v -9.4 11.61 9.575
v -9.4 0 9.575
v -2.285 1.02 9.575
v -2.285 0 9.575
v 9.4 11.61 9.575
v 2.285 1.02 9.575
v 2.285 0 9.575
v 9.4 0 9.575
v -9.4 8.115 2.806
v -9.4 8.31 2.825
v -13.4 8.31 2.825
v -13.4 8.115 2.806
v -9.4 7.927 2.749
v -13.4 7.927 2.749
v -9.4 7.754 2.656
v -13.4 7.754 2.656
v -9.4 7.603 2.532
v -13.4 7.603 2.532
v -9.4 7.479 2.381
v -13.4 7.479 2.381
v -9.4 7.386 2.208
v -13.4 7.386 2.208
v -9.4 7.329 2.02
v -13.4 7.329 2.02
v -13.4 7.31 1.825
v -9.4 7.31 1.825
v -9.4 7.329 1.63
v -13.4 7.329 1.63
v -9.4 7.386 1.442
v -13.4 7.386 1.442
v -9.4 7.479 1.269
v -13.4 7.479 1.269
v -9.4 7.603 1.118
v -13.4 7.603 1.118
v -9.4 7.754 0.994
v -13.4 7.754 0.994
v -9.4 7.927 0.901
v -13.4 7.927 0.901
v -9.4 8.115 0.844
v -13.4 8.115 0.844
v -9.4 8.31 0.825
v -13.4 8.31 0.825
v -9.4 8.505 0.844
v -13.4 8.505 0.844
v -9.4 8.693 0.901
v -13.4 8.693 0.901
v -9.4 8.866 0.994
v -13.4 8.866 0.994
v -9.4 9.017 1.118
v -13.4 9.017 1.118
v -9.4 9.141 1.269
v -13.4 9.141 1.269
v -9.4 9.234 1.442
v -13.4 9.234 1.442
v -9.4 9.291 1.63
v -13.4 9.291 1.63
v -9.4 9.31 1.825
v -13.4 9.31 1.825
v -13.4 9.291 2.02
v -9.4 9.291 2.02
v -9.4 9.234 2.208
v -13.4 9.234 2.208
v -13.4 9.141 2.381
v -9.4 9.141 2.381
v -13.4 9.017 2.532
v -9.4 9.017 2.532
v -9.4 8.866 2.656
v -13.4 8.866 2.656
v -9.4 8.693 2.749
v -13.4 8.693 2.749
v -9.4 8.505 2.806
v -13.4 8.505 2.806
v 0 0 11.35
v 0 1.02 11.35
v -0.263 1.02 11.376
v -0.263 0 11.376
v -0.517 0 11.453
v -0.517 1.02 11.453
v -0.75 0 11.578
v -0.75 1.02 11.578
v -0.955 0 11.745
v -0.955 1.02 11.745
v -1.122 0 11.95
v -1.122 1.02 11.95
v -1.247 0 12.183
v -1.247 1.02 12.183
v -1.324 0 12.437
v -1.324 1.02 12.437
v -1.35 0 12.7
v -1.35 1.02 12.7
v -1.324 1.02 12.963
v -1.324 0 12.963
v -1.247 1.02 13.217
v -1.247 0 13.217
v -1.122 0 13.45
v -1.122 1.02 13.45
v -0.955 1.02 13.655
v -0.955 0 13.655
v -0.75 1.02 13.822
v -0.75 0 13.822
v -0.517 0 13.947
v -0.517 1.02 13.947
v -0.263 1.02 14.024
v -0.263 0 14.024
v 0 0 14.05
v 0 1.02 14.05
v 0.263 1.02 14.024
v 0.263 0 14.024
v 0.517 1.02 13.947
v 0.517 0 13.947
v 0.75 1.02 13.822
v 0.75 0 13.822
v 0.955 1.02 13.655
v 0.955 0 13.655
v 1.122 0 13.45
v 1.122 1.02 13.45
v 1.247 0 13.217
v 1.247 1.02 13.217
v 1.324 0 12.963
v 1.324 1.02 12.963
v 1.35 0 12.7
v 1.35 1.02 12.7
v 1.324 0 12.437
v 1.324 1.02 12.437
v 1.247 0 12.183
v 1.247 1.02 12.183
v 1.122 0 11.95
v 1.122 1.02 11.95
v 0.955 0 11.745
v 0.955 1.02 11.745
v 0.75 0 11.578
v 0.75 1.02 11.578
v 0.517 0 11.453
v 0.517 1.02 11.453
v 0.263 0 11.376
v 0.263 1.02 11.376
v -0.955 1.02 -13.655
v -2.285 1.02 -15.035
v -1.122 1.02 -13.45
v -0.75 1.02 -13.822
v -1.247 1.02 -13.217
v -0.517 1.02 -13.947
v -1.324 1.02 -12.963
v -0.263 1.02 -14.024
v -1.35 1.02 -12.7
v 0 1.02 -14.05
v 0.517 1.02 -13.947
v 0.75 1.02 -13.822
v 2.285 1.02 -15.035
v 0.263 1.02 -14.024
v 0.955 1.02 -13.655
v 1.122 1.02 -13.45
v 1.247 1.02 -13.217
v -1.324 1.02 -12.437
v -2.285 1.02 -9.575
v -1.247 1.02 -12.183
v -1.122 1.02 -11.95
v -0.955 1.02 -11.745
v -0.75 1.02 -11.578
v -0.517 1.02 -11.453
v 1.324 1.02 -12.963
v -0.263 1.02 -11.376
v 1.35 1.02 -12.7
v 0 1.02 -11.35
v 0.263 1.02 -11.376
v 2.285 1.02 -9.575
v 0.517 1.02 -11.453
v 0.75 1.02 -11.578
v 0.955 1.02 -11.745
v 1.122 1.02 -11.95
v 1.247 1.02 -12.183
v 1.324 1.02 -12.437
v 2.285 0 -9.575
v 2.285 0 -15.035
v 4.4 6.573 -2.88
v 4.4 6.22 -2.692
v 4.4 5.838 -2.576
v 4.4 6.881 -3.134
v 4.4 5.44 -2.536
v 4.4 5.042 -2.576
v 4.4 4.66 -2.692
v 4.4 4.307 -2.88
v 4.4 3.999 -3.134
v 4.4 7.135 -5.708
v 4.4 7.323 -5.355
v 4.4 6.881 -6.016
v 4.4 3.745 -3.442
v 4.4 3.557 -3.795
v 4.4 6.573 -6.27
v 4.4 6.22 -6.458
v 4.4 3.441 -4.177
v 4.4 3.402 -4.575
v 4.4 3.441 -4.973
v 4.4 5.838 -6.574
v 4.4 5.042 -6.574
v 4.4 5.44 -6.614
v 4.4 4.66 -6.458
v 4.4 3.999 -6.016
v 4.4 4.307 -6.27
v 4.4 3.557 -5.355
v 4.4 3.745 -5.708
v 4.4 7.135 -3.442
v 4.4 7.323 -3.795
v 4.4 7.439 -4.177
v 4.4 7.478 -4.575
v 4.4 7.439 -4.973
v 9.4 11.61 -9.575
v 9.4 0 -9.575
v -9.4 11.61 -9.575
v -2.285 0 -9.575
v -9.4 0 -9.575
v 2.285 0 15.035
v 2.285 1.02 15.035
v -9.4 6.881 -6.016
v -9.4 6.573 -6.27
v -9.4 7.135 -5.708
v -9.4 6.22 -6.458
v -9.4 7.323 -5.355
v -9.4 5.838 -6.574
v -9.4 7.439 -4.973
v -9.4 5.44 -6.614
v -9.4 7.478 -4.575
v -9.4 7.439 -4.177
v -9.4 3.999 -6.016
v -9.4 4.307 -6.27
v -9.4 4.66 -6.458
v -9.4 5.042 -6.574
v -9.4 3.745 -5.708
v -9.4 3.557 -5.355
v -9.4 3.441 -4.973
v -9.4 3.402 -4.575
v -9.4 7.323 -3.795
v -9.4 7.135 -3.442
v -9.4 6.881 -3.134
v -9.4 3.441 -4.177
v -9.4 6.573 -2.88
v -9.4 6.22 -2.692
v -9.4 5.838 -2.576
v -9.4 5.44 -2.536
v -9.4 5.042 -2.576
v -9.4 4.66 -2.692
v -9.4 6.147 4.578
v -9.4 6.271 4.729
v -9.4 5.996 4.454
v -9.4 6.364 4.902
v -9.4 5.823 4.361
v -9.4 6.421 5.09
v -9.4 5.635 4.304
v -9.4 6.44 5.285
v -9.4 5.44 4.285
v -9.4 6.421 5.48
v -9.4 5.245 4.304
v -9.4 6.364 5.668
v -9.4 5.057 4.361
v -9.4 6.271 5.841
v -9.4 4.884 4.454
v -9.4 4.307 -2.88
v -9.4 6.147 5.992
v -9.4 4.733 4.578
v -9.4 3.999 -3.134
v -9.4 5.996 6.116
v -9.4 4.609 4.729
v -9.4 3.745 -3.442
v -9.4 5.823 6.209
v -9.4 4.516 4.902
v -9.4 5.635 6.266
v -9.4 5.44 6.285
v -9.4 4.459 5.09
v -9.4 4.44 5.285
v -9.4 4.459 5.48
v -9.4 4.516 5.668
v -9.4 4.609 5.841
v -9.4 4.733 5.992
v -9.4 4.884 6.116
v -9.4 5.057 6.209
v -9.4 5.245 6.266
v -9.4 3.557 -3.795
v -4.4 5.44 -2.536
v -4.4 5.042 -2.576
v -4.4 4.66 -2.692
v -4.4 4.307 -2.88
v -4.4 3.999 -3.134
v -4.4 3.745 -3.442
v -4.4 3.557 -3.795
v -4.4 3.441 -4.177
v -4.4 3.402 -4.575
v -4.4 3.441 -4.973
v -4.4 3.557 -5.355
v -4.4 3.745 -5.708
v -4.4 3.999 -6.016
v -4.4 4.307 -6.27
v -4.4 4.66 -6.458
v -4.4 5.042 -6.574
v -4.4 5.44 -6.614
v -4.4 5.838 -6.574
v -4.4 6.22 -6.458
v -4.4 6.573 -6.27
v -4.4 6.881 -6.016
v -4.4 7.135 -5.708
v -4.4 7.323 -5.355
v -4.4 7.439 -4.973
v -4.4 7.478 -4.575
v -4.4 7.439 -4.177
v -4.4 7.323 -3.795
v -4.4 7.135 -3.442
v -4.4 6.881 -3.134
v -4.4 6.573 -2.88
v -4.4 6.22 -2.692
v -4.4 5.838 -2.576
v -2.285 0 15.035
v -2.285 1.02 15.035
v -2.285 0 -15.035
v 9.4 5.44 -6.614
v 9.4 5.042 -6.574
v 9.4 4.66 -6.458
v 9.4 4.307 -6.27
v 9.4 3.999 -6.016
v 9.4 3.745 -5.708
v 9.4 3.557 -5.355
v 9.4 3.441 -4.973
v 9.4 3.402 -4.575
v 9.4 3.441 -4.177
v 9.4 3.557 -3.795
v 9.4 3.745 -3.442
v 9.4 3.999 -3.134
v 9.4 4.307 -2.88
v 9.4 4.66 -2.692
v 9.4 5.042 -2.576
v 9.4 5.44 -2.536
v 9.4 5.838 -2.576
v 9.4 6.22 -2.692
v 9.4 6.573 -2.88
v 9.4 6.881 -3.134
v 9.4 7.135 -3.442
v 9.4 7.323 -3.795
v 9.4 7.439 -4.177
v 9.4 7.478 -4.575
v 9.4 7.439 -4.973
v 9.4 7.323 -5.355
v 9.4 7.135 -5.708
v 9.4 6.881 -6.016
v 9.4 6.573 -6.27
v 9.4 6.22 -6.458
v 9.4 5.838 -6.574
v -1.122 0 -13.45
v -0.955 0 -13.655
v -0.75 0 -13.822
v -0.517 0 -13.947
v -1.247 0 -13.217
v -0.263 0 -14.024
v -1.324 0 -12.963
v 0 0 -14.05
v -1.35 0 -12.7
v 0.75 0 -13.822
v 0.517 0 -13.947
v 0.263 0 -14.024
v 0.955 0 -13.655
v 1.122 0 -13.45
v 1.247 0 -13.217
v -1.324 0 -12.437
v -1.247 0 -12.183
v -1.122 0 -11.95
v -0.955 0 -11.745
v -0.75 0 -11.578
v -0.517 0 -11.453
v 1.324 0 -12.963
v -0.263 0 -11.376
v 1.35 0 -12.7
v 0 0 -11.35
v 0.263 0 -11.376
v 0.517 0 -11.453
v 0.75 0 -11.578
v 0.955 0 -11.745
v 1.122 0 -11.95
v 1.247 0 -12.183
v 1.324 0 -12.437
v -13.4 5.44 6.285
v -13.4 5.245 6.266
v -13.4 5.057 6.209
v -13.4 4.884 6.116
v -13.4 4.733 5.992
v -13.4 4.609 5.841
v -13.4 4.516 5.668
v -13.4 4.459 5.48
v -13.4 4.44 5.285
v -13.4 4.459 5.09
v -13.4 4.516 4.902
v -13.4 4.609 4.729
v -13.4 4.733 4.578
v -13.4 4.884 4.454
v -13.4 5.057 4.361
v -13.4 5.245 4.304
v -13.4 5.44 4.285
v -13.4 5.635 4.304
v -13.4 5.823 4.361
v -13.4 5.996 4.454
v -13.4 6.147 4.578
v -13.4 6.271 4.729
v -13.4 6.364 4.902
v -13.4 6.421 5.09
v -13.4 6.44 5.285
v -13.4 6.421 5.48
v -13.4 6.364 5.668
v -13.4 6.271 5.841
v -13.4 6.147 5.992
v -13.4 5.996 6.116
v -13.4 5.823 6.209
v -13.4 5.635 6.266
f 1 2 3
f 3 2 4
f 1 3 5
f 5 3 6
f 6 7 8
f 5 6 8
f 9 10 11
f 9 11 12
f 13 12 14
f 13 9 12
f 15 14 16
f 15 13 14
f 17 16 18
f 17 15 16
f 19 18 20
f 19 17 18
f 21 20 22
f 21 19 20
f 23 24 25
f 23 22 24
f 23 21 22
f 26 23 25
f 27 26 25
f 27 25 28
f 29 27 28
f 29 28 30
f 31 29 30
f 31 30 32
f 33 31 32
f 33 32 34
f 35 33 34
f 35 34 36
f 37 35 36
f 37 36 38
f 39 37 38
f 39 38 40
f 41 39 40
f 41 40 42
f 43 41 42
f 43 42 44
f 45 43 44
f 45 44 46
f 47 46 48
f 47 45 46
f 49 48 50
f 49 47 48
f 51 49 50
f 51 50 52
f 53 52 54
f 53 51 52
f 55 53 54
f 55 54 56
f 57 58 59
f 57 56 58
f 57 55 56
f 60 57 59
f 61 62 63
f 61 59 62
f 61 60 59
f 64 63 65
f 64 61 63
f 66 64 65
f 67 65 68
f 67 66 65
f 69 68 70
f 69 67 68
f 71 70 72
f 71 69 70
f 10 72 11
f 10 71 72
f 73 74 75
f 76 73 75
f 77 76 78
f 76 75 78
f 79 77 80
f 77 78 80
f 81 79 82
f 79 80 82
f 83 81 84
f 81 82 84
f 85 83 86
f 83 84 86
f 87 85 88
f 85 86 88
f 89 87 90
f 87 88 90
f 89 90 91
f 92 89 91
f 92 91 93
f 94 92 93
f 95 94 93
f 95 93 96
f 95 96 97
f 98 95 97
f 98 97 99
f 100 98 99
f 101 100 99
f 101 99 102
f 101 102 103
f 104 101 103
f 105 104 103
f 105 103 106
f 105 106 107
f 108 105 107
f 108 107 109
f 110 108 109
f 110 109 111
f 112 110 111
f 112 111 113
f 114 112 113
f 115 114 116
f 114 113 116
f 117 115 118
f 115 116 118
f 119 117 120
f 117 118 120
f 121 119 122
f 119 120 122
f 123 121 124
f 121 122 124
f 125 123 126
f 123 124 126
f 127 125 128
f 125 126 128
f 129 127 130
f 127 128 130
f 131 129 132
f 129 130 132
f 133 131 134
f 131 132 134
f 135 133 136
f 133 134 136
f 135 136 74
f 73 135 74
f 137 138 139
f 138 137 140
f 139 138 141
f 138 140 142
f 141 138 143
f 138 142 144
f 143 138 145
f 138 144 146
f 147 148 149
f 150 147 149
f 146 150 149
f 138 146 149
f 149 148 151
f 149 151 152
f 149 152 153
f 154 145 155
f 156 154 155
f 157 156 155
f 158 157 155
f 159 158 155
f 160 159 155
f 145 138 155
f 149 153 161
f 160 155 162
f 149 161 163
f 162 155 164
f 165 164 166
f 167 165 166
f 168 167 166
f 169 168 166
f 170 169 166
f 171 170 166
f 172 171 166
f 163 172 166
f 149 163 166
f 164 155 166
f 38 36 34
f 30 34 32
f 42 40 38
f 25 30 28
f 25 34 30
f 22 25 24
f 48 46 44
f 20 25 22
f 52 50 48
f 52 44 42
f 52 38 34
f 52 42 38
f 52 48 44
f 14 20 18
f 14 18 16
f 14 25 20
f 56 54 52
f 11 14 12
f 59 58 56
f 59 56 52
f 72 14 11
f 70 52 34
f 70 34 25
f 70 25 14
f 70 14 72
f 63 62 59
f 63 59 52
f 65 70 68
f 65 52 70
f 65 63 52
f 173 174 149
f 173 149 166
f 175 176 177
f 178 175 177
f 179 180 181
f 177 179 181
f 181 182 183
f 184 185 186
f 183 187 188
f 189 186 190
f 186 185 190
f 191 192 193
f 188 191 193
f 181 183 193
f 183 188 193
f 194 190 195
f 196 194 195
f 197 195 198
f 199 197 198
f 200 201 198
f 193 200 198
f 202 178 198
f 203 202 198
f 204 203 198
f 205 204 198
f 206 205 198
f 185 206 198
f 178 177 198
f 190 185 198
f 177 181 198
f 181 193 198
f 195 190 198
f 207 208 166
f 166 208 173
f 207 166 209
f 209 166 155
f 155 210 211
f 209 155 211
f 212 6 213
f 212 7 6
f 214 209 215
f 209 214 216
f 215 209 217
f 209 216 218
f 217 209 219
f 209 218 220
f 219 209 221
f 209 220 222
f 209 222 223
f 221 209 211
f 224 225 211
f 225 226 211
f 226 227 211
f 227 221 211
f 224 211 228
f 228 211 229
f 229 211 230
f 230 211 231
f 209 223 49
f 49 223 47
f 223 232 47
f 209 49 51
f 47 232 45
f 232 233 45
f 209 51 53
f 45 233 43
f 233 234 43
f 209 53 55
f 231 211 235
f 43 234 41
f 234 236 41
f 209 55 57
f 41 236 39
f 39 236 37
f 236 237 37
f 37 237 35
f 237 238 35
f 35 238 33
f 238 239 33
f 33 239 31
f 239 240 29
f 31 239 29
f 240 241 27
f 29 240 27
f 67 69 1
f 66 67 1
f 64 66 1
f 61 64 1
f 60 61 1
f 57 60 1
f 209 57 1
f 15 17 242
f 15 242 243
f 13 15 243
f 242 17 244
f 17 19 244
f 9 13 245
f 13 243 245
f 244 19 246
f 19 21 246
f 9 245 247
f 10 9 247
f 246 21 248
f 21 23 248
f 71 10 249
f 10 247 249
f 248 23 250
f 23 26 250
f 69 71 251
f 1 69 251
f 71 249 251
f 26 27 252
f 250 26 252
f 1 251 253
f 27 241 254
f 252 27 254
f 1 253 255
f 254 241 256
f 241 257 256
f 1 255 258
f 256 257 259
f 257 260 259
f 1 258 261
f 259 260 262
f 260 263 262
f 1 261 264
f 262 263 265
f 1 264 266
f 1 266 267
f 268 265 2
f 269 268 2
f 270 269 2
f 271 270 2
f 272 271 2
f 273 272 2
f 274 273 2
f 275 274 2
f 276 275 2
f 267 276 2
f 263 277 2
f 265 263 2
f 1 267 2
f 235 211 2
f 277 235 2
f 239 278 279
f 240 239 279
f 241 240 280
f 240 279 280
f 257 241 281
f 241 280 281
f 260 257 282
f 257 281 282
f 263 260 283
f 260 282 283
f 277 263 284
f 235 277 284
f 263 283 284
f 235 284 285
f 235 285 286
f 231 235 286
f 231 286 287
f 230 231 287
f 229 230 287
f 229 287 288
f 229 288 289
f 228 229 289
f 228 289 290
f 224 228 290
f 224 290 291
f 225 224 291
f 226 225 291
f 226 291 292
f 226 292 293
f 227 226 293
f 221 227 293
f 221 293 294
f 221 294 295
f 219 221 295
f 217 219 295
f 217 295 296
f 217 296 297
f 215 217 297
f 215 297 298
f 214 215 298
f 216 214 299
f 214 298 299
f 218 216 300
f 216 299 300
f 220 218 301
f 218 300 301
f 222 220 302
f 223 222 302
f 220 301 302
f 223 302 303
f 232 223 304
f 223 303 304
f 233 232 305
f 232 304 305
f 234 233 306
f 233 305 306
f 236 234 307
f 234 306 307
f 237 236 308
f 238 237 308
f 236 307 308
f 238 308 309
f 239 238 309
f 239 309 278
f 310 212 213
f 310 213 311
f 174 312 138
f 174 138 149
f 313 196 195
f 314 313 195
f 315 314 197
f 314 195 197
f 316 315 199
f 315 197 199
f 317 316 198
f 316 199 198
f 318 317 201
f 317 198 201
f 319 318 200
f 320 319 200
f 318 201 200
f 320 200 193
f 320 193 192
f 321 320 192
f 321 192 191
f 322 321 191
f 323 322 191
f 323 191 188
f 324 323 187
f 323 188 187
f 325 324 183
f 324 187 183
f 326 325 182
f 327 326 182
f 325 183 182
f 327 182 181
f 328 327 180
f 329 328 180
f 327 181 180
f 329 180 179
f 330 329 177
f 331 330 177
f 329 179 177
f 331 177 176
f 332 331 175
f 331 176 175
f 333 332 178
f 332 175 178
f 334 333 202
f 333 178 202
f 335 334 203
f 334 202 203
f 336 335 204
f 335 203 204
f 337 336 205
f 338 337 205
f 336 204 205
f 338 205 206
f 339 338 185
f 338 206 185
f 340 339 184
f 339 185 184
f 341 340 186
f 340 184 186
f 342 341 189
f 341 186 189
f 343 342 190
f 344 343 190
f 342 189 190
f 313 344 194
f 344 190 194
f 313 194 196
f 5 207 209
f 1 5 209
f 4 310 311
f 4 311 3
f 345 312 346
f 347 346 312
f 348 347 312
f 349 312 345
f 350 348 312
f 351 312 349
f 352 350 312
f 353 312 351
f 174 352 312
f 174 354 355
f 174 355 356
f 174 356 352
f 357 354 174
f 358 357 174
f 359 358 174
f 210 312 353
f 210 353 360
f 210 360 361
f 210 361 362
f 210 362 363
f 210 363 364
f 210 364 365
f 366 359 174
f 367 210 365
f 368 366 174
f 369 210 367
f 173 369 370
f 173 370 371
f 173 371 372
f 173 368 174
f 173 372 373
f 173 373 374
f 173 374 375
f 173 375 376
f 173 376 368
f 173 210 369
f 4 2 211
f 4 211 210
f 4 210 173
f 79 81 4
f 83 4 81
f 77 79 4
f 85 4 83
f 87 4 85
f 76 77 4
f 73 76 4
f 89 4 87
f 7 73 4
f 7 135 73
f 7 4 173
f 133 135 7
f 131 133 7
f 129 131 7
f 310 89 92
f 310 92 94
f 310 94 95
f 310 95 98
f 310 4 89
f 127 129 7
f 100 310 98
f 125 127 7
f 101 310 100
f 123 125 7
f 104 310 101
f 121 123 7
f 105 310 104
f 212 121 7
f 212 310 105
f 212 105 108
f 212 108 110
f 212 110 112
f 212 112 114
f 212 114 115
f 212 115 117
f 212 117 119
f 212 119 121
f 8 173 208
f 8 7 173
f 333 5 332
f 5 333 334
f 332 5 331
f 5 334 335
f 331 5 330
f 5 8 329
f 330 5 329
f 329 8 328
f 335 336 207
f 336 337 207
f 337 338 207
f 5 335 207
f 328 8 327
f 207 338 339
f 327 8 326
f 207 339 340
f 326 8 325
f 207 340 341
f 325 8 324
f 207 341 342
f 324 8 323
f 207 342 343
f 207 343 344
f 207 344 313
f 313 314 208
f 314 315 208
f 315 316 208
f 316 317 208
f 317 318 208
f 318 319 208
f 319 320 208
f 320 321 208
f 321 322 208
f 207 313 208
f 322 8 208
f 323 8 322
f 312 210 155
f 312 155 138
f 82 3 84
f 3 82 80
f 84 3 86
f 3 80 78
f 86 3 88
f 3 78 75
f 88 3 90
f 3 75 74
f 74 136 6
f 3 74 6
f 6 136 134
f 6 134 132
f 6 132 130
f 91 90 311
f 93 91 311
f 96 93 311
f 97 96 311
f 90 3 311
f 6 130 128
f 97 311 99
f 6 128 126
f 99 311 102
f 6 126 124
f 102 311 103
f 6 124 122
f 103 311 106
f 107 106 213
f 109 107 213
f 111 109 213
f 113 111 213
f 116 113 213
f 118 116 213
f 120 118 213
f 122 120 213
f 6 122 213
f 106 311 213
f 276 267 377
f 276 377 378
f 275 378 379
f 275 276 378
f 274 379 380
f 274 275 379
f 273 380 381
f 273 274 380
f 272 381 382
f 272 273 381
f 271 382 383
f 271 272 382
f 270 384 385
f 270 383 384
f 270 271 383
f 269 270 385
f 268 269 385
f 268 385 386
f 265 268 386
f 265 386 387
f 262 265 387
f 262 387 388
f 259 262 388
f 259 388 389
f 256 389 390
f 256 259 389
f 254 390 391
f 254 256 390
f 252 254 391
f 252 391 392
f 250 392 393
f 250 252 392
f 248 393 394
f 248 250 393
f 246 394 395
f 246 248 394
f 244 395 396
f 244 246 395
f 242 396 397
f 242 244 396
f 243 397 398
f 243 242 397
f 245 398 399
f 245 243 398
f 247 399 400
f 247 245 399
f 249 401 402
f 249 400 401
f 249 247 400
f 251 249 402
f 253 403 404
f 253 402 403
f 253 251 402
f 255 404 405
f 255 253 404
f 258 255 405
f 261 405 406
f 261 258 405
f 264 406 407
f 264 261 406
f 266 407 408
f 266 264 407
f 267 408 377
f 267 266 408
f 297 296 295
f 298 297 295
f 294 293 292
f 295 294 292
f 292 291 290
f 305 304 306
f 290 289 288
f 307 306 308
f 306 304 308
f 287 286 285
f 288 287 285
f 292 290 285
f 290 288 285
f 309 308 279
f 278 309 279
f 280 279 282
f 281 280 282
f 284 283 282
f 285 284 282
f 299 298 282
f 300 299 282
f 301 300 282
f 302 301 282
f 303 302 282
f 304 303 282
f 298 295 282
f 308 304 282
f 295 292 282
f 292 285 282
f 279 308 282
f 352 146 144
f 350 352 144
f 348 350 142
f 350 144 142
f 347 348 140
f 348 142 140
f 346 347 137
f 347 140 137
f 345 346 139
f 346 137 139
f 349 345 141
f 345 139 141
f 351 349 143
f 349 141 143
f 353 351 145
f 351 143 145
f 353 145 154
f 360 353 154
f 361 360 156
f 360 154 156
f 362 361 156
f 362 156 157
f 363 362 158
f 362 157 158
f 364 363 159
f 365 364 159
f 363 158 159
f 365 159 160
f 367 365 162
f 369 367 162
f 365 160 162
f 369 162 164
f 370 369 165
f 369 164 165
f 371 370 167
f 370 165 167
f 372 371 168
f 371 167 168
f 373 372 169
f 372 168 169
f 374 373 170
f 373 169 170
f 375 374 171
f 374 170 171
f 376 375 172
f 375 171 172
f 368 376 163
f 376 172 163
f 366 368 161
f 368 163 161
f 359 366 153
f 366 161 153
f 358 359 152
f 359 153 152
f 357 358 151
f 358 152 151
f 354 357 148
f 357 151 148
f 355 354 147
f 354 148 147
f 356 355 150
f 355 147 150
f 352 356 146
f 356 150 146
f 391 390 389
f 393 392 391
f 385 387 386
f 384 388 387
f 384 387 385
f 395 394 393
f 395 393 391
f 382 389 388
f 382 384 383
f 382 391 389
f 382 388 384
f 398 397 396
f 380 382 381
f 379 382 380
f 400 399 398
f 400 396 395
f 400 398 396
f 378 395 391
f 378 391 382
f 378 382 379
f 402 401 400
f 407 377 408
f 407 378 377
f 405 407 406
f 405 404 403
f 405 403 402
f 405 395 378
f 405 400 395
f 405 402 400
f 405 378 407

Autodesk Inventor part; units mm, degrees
ref_plane "YZ Plane" through (0, 0, 0) normal (1, 0, 0) x (0, 1, 0)
ref_plane "XZ Plane" through (0, 0, 0) normal (0, 1, 0) x (-1, 0, 0)
ref_plane "XY Plane" through (0, 0, 0) normal (0, 0, 1) x (1, 0, 0)
sketch "Sketch1" plane through (0, 0, 0) normal (0, 1, 0) x (-1, 0, 0)
  line L0 (9.4, 9.575) -> (-9.4, 9.575)
  line L1 (-9.4, 9.575) -> (-9.4, -9.575)
  line L2 (-9.4, -9.575) -> (9.4, -9.575)
  line L3 (9.4, -9.575) -> (9.4, 9.575)
  line L4 (9.4, 9.575) -> (-9.4, -9.575) construction
  line L5 (-9.4, 9.575) -> (9.4, -9.575) construction
  point P0 (0, 0)
  dimension "d0" = 18.8
  dimension "d1" = 19.15
extrude "Extrusion1" add sketch "Sketch1" along normal blind 11.61
sketch "Sketch6" plane through (9.4, 0, 9.575) normal (1, 0, 0) x (0, 0, -1)
  line L0 (0, 0) -> (19.15, 0) projected
  line L1 (0, 0) -> (0, 11.61) projected
  line L2 (19.15, 0) -> (19.15, 11.61) projected
  point P0 (9.575, 0)
  point P1 (14.15, 5.44)
  dimension "d60" = 5.44
  dimension "d76" = 5
hole "Hole6" at (9.4, 5.44, -4.575) direction (-1, 0, 0) diameter 4.077 depth 5
sketch "Sketch7" plane through (-9.4, 0, -9.575) normal (-1, 0, 0) x (0, 0, 1)
  circle A0 centre (5, 5.44) radius 2.0385 projected
  point P0 (9.575, 0)
hole "Hole7" at (-9.4, 5.44, -4.575) direction (1, 0, 0) diameter 4.077 depth 5
sketch "Sketch8" plane through (0, 11.61, 0) normal (0, 1, 0) x (1, 0, 0)
  line L0 (-37.5313, 24.2217) -> (38.0409, 24.2217) construction
  line L1 (38.0409, 24.2217) -> (38.0409, -24.8493) construction
  line L2 (38.0409, -24.8493) -> (-37.5313, -24.8493) construction
  line L3 (-37.5313, -24.8493) -> (-37.5313, 24.2217) construction
  point P0 (0, 0)
sketch "Sketch9" plane through (0, 0, 0) normal (0, -1, 0) x (1, 0, 0)
  line L0 (2.285, 15.035) -> (-2.285, 15.035)
  line L1 (-2.285, 15.035) -> (-2.285, -15.035)
  line L2 (-2.285, -15.035) -> (2.285, -15.035)
  line L3 (2.285, -15.035) -> (2.285, 15.035)
  line L4 (2.285, 15.035) -> (-2.285, -15.035) construction
  line L5 (-2.285, 15.035) -> (2.285, -15.035) construction
  point P0 (0, 0)
  dimension "d77" = 4.57
  dimension "d78" = 30.07
extrude "Extrusion2" add sketch "Sketch9" against normal blind 1.02
sketch "Sketch10" plane through (0, 0, 0) normal (0, -1, 0) x (1, 0, 0)
  line L0 (-2.285, -15.035) -> (2.285, -15.035) construction
  line L1 (0, -15.035) -> (0, 15.035) construction
  line L2 (-2.285, 15.035) -> (2.285, 15.035) construction
  point P0 (0, 0)
  point P1 (0, -12.7)
  point P2 (0, 12.7)
  dimension "d81" = 12.7
  dimension "d82" = 12.7
hole "Hole8" at (0, 0, -12.7) at (0, 0, 12.7) direction (0, 1, 0) diameter 2.7 end through all
sketch "Sketch11" plane through (-9.4, 0, -9.575) normal (-1, 0, 0) x (0, 0, 1)
  circle A0 centre (11.4, 8.31) radius 1
  circle A1 centre (14.86, 5.44) radius 1
  line L0 (0, 0) -> (19.15, 0) projected
  line L1 (0, 0) -> (0, 11.61) projected
  point P0 (9.575, 0)
  dimension "d90" = 2
  dimension "d91" = 2
  dimension "d92" = 5.44
  dimension "d93" = 8.31
  dimension "d94" = 14.86
  dimension "d95" = 11.4
extrude "Extrusion3" add sketch "Sketch11" along normal blind 4
sketch "Sketch12" plane through (0, 11.61, 0) normal (0, 1, 0) x (1, 0, 0)
  line L0 (-9.3536, 9.4666) -> (9.2116, 9.4666) construction
  line L1 (9.2116, 9.4666) -> (9.2116, -9.4331) construction
  line L2 (9.2116, -9.4331) -> (-9.3536, -9.4331) construction
  line L3 (-9.3536, -9.4331) -> (-9.3536, 9.4666) construction
properties part number "USB-1SP16T-83H-01"
